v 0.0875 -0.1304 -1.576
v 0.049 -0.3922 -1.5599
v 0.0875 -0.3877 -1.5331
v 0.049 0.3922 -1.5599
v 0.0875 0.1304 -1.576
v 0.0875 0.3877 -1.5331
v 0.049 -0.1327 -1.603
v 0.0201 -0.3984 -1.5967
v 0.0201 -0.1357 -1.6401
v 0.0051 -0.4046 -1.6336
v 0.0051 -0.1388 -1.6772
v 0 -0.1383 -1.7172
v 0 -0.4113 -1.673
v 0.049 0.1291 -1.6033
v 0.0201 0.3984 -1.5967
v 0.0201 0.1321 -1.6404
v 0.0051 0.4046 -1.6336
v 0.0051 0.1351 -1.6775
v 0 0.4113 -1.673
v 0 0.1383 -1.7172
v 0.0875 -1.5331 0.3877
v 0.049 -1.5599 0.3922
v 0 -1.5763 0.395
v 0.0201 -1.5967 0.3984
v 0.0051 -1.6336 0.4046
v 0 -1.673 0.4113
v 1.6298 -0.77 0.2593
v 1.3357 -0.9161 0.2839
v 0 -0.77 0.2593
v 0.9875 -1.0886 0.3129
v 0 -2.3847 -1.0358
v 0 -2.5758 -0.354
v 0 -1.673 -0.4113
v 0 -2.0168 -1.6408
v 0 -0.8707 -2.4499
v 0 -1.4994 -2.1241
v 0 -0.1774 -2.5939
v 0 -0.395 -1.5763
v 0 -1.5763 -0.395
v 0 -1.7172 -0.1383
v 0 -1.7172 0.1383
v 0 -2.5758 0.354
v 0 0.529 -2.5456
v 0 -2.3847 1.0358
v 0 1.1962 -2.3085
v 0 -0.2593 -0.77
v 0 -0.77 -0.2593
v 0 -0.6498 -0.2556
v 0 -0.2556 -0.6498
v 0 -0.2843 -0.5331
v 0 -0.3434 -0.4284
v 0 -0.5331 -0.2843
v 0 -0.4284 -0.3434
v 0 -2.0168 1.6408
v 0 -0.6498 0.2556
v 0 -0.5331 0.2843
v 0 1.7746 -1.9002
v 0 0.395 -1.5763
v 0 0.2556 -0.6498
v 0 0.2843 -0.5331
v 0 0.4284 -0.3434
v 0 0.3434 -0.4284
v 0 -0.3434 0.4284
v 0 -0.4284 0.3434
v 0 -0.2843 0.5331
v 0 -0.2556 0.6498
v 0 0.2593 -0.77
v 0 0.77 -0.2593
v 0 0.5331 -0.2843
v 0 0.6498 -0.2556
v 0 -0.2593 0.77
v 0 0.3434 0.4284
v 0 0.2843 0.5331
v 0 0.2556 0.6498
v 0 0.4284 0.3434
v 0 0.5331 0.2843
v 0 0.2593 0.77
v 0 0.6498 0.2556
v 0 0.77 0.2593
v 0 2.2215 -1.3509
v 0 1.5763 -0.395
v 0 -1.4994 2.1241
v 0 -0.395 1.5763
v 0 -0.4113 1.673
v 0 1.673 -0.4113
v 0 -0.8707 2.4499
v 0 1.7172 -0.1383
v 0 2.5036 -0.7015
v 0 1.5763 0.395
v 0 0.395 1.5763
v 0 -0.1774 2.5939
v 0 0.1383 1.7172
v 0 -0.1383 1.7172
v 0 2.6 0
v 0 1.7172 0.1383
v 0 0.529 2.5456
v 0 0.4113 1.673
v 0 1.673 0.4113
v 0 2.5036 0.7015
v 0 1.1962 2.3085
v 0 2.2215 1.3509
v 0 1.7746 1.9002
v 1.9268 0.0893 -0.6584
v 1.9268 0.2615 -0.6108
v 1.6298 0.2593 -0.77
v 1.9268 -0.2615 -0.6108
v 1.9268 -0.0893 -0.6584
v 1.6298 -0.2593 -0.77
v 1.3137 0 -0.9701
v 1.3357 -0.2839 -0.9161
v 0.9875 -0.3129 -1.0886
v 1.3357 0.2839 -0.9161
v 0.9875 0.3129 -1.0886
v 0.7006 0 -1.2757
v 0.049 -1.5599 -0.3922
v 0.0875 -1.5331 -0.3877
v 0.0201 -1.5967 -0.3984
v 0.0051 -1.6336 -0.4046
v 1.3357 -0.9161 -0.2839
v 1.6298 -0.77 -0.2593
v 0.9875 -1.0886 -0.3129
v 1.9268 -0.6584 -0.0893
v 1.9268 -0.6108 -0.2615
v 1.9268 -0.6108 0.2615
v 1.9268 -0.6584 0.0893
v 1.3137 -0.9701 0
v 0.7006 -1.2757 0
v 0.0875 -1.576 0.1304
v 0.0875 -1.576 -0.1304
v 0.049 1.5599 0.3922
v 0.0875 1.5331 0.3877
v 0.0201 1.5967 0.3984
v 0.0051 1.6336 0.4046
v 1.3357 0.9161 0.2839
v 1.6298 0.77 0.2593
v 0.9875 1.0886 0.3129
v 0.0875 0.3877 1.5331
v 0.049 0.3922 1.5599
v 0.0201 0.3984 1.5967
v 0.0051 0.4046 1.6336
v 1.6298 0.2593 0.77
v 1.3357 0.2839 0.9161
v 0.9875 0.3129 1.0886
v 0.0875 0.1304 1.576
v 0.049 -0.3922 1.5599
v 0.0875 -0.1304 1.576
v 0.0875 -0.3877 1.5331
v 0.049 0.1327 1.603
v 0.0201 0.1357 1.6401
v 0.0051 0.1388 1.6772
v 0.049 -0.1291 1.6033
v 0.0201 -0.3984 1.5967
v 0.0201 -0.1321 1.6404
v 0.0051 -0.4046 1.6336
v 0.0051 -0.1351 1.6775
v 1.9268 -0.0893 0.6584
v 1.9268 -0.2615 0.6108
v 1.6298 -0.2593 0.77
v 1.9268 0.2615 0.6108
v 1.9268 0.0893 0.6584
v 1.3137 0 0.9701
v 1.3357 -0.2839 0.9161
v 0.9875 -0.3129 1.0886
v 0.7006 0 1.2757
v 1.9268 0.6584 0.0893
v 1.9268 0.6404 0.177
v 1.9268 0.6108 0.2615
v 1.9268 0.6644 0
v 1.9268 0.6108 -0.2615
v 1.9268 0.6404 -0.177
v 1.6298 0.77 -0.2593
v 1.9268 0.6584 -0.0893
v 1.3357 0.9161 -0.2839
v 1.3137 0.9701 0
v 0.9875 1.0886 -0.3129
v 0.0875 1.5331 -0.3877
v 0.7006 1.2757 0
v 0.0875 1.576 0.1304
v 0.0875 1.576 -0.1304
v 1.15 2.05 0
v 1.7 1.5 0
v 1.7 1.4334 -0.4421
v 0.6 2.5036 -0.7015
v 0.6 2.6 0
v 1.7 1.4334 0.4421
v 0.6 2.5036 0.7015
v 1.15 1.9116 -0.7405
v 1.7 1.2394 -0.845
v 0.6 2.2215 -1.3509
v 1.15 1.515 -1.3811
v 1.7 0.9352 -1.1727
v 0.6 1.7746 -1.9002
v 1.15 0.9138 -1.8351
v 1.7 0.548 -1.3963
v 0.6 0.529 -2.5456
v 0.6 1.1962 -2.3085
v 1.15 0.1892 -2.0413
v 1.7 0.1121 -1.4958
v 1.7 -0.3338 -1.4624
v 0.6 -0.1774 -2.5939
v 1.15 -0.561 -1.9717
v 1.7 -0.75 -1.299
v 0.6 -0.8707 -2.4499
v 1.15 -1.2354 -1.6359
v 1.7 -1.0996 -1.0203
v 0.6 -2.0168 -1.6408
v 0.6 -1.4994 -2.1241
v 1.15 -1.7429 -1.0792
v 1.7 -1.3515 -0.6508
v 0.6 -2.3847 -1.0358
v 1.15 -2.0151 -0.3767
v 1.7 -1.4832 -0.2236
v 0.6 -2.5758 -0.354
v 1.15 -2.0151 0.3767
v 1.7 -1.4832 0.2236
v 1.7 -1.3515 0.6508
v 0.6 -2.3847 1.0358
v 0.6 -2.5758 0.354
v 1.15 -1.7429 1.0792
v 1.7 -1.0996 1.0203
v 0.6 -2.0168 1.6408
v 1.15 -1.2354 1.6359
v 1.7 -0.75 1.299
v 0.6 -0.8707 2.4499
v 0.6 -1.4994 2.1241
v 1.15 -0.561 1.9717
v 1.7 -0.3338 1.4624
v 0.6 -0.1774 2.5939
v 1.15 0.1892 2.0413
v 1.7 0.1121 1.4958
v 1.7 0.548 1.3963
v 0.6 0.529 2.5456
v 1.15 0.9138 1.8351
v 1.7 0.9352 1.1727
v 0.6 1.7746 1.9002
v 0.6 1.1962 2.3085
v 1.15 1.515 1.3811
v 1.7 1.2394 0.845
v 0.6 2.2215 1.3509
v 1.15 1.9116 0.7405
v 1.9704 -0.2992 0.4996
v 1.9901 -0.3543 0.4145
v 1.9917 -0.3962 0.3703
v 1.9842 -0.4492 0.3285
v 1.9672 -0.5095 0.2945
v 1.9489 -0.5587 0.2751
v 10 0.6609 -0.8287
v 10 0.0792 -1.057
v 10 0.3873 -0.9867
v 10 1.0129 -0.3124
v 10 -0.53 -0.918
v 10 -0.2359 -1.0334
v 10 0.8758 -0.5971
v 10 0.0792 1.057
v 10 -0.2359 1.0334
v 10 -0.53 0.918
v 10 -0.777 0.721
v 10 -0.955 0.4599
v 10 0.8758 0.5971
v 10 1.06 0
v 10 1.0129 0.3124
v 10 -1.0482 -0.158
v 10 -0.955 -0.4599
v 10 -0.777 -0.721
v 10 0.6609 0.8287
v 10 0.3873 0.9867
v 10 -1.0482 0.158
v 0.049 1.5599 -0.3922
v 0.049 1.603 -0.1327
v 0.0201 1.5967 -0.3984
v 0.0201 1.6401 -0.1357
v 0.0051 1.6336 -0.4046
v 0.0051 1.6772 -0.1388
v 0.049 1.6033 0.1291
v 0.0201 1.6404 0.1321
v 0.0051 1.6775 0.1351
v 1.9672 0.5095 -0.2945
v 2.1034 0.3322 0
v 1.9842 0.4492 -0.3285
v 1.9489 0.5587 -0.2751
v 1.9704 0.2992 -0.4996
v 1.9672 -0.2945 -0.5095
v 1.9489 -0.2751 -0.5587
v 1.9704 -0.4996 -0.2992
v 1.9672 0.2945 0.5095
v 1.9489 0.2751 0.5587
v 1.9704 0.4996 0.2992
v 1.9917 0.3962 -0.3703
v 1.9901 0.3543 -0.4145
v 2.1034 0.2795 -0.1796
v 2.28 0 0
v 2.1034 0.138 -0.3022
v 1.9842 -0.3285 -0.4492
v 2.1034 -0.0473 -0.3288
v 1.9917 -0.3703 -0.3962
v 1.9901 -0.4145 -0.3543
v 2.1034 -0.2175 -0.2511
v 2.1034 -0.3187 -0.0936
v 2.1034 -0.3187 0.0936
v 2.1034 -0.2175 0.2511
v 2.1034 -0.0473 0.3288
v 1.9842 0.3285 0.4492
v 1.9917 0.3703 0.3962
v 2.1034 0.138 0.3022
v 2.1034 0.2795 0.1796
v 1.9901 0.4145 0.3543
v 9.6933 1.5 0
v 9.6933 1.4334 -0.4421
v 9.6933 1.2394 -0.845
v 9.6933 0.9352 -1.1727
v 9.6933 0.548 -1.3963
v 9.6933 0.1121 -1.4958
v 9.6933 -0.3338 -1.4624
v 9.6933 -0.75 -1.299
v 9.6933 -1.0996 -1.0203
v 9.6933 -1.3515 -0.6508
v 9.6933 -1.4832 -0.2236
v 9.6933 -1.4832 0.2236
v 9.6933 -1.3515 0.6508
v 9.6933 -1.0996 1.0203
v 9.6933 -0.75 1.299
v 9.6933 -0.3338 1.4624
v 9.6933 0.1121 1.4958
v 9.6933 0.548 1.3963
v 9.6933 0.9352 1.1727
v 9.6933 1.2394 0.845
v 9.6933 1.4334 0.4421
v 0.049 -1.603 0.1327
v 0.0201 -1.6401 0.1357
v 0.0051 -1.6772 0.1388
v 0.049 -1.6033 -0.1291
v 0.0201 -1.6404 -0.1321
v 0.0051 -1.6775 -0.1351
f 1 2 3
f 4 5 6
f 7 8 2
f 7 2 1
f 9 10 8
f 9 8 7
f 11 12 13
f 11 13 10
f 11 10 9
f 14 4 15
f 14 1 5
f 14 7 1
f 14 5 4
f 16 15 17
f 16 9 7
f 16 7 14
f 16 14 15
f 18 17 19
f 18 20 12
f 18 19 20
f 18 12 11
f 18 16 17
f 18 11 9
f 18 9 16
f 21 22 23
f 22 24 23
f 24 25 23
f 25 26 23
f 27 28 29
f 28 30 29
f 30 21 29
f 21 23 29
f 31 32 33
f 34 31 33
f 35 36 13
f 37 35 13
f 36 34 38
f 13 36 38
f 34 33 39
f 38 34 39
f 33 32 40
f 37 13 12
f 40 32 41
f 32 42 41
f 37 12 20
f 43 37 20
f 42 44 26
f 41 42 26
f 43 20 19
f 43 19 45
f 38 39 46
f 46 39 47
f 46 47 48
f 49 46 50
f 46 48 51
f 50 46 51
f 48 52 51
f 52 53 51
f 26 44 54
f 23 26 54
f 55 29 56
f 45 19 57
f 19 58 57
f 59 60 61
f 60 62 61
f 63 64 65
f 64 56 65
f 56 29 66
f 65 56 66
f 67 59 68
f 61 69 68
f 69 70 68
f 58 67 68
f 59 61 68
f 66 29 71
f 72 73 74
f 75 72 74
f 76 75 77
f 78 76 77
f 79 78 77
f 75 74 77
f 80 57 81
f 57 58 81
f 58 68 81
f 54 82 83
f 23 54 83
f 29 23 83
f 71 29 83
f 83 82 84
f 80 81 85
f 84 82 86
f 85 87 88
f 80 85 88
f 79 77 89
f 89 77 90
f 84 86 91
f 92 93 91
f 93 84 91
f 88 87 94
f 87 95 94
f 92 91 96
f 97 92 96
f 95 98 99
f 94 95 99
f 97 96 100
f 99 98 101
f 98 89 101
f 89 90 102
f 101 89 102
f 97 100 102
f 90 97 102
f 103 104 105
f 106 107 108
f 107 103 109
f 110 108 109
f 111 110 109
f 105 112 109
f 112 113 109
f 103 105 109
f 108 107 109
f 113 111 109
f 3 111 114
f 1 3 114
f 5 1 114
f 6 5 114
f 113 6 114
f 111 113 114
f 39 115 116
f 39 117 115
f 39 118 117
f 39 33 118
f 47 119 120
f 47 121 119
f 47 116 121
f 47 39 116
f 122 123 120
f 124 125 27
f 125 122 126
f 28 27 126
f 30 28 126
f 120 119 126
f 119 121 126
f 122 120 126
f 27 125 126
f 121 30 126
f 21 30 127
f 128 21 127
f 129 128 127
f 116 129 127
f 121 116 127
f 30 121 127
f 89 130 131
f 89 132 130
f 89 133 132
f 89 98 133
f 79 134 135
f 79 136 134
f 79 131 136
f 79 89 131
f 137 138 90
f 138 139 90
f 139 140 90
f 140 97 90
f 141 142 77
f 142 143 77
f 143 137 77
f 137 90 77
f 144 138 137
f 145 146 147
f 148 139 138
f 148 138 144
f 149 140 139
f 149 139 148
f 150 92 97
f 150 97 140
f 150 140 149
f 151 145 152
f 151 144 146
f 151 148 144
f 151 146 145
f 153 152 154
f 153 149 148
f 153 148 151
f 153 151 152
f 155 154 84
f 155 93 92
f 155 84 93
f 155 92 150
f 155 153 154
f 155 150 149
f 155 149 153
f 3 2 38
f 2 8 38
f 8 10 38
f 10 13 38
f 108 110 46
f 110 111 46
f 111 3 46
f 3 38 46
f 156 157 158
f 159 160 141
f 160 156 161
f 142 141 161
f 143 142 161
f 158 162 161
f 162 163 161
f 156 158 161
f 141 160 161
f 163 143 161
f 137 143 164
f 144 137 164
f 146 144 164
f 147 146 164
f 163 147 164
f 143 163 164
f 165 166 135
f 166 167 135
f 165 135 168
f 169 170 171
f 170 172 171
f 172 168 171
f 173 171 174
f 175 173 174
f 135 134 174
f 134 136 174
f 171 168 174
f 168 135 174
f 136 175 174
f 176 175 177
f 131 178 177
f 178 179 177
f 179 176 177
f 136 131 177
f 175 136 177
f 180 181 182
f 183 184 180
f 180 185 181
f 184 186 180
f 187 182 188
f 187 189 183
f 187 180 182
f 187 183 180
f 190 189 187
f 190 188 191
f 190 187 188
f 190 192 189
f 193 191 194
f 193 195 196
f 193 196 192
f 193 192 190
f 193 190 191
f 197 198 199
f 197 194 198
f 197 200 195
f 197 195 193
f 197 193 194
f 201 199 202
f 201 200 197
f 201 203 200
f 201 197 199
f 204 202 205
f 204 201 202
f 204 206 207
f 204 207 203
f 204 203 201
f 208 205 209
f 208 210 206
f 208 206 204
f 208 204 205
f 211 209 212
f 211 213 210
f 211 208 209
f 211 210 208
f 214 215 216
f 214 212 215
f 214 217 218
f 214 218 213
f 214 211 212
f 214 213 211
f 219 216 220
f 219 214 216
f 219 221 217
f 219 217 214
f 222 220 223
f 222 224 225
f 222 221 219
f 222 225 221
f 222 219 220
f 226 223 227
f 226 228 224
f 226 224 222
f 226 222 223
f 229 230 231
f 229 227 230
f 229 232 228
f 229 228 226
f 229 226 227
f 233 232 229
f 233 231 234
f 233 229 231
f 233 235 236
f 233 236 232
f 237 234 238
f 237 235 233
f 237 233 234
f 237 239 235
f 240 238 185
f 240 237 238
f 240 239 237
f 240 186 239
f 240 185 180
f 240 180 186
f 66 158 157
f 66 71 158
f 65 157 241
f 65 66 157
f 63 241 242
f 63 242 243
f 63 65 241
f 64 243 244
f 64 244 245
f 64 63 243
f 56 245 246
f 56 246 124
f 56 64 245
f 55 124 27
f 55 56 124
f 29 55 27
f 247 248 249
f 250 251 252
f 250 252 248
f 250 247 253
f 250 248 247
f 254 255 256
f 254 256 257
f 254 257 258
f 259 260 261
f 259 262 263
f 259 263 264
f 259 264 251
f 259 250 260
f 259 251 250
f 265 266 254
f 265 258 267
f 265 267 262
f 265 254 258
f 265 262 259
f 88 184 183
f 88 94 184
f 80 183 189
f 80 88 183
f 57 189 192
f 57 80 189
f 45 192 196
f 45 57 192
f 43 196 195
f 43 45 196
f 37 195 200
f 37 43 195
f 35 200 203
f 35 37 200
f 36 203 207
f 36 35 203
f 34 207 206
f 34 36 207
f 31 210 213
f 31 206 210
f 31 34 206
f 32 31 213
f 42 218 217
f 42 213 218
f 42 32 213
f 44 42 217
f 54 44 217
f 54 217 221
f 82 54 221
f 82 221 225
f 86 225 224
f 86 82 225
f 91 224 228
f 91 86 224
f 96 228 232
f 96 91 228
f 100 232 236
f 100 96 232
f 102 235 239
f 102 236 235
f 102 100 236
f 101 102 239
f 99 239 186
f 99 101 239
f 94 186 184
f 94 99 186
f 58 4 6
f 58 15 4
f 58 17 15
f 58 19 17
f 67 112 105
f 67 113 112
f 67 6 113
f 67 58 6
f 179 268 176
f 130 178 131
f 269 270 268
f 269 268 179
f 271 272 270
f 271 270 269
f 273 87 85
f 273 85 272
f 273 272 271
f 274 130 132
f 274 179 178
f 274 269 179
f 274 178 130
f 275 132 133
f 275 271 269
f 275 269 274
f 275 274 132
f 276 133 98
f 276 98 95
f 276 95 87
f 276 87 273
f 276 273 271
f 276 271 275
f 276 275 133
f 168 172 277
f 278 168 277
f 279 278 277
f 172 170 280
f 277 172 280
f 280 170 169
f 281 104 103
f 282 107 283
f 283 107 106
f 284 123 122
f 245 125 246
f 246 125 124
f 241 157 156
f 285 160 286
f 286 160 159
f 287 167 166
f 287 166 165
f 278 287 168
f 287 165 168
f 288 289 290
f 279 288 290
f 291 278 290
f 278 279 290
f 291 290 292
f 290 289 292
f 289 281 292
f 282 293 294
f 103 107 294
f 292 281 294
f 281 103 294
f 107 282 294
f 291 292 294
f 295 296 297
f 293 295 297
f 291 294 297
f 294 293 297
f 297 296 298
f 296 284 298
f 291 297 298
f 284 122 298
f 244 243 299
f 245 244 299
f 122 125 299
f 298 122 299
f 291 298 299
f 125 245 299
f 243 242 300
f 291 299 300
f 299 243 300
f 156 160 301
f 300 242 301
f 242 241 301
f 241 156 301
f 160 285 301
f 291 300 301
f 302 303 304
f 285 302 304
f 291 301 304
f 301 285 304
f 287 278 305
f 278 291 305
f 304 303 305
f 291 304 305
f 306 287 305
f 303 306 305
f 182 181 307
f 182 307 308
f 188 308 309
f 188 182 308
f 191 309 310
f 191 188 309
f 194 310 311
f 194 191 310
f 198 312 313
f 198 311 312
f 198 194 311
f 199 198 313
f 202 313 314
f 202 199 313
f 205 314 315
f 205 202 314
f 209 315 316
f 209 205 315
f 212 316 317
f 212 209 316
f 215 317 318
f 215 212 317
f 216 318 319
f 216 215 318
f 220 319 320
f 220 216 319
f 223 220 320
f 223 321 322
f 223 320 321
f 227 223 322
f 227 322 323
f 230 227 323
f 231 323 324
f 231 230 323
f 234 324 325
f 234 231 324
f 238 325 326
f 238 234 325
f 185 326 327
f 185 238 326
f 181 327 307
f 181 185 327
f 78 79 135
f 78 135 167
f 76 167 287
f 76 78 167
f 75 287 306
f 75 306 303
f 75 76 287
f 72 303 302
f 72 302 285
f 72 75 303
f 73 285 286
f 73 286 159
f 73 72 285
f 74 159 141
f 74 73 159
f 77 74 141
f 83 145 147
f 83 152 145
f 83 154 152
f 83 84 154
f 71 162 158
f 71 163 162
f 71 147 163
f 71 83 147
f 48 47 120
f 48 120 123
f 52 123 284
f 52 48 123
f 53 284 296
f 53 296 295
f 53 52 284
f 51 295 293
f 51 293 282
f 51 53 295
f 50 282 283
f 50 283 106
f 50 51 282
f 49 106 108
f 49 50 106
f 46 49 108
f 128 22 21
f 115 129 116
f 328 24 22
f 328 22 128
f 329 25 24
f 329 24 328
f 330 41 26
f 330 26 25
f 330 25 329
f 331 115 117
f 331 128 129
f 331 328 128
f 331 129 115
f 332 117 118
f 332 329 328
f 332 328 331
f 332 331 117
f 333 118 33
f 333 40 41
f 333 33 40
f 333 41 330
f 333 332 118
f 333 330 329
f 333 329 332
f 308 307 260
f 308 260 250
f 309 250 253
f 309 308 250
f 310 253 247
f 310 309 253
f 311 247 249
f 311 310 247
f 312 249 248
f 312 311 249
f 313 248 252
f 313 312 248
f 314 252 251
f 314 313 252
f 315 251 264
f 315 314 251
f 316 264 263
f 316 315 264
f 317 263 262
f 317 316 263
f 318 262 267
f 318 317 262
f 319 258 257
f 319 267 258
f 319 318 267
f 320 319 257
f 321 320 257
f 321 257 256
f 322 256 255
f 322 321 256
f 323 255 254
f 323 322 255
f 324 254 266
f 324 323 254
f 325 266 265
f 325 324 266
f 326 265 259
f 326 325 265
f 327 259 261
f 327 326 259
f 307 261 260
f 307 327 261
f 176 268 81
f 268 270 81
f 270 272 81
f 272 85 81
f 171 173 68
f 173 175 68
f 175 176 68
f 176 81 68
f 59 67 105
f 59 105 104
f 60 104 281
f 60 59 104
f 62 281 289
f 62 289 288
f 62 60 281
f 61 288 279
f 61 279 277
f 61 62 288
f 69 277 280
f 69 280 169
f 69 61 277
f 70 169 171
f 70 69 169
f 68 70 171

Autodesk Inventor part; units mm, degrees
ref_plane "YZ Plane" through (0, 0, 0) normal (1, 0, 0) x (0, 1, 0)
ref_plane "XZ Plane" through (0, 0, 0) normal (0, 1, 0) x (-1, 0, 0)
sketch "Эскиз1" plane through (0, 0, 0) normal (0, 0, 1) x (1, 0, 0)
  line L0 (2.28, 0) -> (10, 0)
  line L1 (10, 0) -> (10, 1.5)
  line L2 (10, 1.5) -> (1.7, 1.5)
  line L3 (0.6, 2.6) -> (0, 2.6)
  line L4 (-2, 0) -> (12, 0) projected
  line L5 (0, -0.52) -> (0, 3.12) projected
  line L6 (0, 1.625) -> (1.9268, 0.6644)
  line L7 (1.9268, 0.6644) -> (2.28, 0)
  line L8 (1.7, 1.5) -> (0.6, 2.6)
  line L9 (0, 2.6) -> (0, 1.625)
  dimension "d2" = 3
  dimension "d3" = 5.2
  dimension "d4" = 2.28
  dimension "d5" = 3.25
  dimension "d6" = 26.5
  dimension "d7" = 62
  dimension "d13" = 45
  dimension "d14" = 1.7
  dimension "d15" = 10
revolve "Базовый элемент" add sketch "Эскиз1" angle 360 about axis through (2.28, 0, 0) along (1, 0, 0) contours L7 L6 L5 L3 L8 L2 L1 L0
sketch "Эскиз2" plane through (0, 0, 0) normal (-1, 0, 0) x (0, 0, 1)
  line L0 (0, -3.64) -> (0, 3.64) projected
  line L1 (-3.64, 0) -> (3.64, 0) projected
  line L2 (0, 1.625) -> (0, 0) construction
  line L3 (0, 0) -> (1.625, 0) construction
  arc A0 (0.5417, 0) -> (0, 0.5417) centre (0, 0) ccw
  line L4 (0, 0) -> (0.7947, 0.7947) construction
  arc A1 (0.8125, 0) -> (0, 0.8125) centre (0, 0) ccw construction
  line L5 (0.395, 1.5763) -> (0.2593, 0.77)
  line L6 (1.5763, 0.395) -> (0.77, 0.2593)
  arc A2 (0.2593, 0.77) -> (0.77, 0.2593) centre (0.6964, 0.6964) ccw
  arc A3 (1.625, 0) -> (1.5763, 0.395) centre (0, 0) ccw
  arc A4 (0.395, 1.5763) -> (0, 1.625) centre (0, 0) ccw
  arc A5 (1.5763, 0.395) -> (0.395, 1.5763) centre (0, 0) ccw
  line L7 (0.395, -1.5763) -> (0.2593, -0.77)
  line L8 (1.5763, -0.395) -> (0.77, -0.2593)
  arc A6 (0.77, -0.2593) -> (0.2593, -0.77) centre (0.6964, -0.6964) ccw
  arc A7 (1.5763, -0.395) -> (1.625, 0) centre (0, 0) ccw
  arc A8 (0, -1.625) -> (0.395, -1.5763) centre (0, 0) ccw
  arc A9 (0.395, -1.5763) -> (1.5763, -0.395) centre (0, 0) ccw
  line L9 (-0.395, 1.5763) -> (-0.2593, 0.77)
  line L10 (-1.5763, 0.395) -> (-0.77, 0.2593)
  arc A10 (-0.77, 0.2593) -> (-0.2593, 0.77) centre (-0.6964, 0.6964) ccw
  arc A11 (-1.5763, 0.395) -> (-1.625, 0) centre (0, 0) ccw
  arc A12 (0, 1.625) -> (-0.395, 1.5763) centre (0, 0) ccw
  arc A13 (-0.395, 1.5763) -> (-1.5763, 0.395) centre (0, 0) ccw
  arc A14 (-1.5763, -0.395) -> (-0.395, -1.5763) centre (0, 0) ccw
  arc A15 (-0.395, -1.5763) -> (0, -1.625) centre (0, 0) ccw
  arc A16 (-1.625, 0) -> (-1.5763, -0.395) centre (0, 0) ccw
  line L11 (-1.5763, -0.395) -> (-0.77, -0.2593)
  arc A17 (-0.2593, -0.77) -> (-0.77, -0.2593) centre (-0.6964, -0.6964) ccw
  line L12 (-0.395, -1.5763) -> (-0.2593, -0.77)
  dimension "d18" = 45
  dimension "d19" = 1.0833
  dimension "d20" = 1.625
  dimension "d21" = 3.25
  dimension "d22" = 0.395
extrude "Паз" add sketch "Эскиз2" against normal up to next contours A2 L5 A5 L6 | L9 A10 L10 A13 | L7 A6 L8 A9 | A14 L11 A17 L12
fillet "Сопряжение1" radius 0.158 4 edges at (0, 1.625, 0) (0, 0, 1.625) (0, -1.625, 0) (0, 0, -1.625)
thread "Резьба" size "M3x0.5" class "6g" standard "ISO Metric profile" length 7.1
chamfer "Фаска1" distance 0.44 distance2 0.3067 1 edges at (10, -1.5, 0) measured on face at (10, 0.3743, 0.3316)
ref_plane "Work Plane2" through (2.032, 0, 0) normal (0, 1, 0) x (1, 0, 0)
equation "\"d2\" = GD"
equation "\"d3\" = KOD"
equation "\"d4\" = INTI"
equation "\"d5\" = SDM"
equation "\"d13\" = 0.5 * SEWI"
equation "\"d14\" = KOH"
equation "\"d15\" = NLG"
equation "\"d19\" = 0.333333 * SDM"
equation "\"d20\" = 0.5 * SDM"
equation "\"d21\" = SDM"
equation "\"d22\" = 0.5 * SBR"
equation "\"d45\" = INTI"
equation "\"d25\" = 0.2 * SBR"
equation "\"d9\" = GEL"
equation "\"d11\" = -0.5 * SPD + 0.5 * GD"
equation "\"d12\" = GUL"
equation "\"GD\" = NND"
equation "\"NLG\" = 10"
equation "\"GEL\" = 7.1"
equation "\"KOD\" = 5.2"
equation "\"KOH\" = 1.7"
equation "\"SDM\" = 3.25"
equation "\"INTI\" = 2.28"
equation "\"SBR\" = 0.79"
equation "\"GUL\" = 0.61345 * PTC"
equation "\"SPD\" = 2.12"
equation "\"SEWI\" = 90deg"
equation "\"d1\" = KOH"
equation "\"d17\" = SDM"
equation "\"TOA\" = 30deg"
equation "\"KODMAX\" = 6.3"
equation "\"EPV\" = 3.15"
equation "\"THREADDIA\" = 3"
equation "\"BDM\" = 3"
equation "\"PTC\" = 0.5"
equation "\"NND\" = 3"
equation "\"GAL\" = 0.61345 * PTC"
equation "\"GD1\" = THREADDIA - 1.2269 * PTC"
properties part number "IFI 513 - M3x0,5 x 10, CRFCHMSTIM(1)" material "Сталь, мягкая"
